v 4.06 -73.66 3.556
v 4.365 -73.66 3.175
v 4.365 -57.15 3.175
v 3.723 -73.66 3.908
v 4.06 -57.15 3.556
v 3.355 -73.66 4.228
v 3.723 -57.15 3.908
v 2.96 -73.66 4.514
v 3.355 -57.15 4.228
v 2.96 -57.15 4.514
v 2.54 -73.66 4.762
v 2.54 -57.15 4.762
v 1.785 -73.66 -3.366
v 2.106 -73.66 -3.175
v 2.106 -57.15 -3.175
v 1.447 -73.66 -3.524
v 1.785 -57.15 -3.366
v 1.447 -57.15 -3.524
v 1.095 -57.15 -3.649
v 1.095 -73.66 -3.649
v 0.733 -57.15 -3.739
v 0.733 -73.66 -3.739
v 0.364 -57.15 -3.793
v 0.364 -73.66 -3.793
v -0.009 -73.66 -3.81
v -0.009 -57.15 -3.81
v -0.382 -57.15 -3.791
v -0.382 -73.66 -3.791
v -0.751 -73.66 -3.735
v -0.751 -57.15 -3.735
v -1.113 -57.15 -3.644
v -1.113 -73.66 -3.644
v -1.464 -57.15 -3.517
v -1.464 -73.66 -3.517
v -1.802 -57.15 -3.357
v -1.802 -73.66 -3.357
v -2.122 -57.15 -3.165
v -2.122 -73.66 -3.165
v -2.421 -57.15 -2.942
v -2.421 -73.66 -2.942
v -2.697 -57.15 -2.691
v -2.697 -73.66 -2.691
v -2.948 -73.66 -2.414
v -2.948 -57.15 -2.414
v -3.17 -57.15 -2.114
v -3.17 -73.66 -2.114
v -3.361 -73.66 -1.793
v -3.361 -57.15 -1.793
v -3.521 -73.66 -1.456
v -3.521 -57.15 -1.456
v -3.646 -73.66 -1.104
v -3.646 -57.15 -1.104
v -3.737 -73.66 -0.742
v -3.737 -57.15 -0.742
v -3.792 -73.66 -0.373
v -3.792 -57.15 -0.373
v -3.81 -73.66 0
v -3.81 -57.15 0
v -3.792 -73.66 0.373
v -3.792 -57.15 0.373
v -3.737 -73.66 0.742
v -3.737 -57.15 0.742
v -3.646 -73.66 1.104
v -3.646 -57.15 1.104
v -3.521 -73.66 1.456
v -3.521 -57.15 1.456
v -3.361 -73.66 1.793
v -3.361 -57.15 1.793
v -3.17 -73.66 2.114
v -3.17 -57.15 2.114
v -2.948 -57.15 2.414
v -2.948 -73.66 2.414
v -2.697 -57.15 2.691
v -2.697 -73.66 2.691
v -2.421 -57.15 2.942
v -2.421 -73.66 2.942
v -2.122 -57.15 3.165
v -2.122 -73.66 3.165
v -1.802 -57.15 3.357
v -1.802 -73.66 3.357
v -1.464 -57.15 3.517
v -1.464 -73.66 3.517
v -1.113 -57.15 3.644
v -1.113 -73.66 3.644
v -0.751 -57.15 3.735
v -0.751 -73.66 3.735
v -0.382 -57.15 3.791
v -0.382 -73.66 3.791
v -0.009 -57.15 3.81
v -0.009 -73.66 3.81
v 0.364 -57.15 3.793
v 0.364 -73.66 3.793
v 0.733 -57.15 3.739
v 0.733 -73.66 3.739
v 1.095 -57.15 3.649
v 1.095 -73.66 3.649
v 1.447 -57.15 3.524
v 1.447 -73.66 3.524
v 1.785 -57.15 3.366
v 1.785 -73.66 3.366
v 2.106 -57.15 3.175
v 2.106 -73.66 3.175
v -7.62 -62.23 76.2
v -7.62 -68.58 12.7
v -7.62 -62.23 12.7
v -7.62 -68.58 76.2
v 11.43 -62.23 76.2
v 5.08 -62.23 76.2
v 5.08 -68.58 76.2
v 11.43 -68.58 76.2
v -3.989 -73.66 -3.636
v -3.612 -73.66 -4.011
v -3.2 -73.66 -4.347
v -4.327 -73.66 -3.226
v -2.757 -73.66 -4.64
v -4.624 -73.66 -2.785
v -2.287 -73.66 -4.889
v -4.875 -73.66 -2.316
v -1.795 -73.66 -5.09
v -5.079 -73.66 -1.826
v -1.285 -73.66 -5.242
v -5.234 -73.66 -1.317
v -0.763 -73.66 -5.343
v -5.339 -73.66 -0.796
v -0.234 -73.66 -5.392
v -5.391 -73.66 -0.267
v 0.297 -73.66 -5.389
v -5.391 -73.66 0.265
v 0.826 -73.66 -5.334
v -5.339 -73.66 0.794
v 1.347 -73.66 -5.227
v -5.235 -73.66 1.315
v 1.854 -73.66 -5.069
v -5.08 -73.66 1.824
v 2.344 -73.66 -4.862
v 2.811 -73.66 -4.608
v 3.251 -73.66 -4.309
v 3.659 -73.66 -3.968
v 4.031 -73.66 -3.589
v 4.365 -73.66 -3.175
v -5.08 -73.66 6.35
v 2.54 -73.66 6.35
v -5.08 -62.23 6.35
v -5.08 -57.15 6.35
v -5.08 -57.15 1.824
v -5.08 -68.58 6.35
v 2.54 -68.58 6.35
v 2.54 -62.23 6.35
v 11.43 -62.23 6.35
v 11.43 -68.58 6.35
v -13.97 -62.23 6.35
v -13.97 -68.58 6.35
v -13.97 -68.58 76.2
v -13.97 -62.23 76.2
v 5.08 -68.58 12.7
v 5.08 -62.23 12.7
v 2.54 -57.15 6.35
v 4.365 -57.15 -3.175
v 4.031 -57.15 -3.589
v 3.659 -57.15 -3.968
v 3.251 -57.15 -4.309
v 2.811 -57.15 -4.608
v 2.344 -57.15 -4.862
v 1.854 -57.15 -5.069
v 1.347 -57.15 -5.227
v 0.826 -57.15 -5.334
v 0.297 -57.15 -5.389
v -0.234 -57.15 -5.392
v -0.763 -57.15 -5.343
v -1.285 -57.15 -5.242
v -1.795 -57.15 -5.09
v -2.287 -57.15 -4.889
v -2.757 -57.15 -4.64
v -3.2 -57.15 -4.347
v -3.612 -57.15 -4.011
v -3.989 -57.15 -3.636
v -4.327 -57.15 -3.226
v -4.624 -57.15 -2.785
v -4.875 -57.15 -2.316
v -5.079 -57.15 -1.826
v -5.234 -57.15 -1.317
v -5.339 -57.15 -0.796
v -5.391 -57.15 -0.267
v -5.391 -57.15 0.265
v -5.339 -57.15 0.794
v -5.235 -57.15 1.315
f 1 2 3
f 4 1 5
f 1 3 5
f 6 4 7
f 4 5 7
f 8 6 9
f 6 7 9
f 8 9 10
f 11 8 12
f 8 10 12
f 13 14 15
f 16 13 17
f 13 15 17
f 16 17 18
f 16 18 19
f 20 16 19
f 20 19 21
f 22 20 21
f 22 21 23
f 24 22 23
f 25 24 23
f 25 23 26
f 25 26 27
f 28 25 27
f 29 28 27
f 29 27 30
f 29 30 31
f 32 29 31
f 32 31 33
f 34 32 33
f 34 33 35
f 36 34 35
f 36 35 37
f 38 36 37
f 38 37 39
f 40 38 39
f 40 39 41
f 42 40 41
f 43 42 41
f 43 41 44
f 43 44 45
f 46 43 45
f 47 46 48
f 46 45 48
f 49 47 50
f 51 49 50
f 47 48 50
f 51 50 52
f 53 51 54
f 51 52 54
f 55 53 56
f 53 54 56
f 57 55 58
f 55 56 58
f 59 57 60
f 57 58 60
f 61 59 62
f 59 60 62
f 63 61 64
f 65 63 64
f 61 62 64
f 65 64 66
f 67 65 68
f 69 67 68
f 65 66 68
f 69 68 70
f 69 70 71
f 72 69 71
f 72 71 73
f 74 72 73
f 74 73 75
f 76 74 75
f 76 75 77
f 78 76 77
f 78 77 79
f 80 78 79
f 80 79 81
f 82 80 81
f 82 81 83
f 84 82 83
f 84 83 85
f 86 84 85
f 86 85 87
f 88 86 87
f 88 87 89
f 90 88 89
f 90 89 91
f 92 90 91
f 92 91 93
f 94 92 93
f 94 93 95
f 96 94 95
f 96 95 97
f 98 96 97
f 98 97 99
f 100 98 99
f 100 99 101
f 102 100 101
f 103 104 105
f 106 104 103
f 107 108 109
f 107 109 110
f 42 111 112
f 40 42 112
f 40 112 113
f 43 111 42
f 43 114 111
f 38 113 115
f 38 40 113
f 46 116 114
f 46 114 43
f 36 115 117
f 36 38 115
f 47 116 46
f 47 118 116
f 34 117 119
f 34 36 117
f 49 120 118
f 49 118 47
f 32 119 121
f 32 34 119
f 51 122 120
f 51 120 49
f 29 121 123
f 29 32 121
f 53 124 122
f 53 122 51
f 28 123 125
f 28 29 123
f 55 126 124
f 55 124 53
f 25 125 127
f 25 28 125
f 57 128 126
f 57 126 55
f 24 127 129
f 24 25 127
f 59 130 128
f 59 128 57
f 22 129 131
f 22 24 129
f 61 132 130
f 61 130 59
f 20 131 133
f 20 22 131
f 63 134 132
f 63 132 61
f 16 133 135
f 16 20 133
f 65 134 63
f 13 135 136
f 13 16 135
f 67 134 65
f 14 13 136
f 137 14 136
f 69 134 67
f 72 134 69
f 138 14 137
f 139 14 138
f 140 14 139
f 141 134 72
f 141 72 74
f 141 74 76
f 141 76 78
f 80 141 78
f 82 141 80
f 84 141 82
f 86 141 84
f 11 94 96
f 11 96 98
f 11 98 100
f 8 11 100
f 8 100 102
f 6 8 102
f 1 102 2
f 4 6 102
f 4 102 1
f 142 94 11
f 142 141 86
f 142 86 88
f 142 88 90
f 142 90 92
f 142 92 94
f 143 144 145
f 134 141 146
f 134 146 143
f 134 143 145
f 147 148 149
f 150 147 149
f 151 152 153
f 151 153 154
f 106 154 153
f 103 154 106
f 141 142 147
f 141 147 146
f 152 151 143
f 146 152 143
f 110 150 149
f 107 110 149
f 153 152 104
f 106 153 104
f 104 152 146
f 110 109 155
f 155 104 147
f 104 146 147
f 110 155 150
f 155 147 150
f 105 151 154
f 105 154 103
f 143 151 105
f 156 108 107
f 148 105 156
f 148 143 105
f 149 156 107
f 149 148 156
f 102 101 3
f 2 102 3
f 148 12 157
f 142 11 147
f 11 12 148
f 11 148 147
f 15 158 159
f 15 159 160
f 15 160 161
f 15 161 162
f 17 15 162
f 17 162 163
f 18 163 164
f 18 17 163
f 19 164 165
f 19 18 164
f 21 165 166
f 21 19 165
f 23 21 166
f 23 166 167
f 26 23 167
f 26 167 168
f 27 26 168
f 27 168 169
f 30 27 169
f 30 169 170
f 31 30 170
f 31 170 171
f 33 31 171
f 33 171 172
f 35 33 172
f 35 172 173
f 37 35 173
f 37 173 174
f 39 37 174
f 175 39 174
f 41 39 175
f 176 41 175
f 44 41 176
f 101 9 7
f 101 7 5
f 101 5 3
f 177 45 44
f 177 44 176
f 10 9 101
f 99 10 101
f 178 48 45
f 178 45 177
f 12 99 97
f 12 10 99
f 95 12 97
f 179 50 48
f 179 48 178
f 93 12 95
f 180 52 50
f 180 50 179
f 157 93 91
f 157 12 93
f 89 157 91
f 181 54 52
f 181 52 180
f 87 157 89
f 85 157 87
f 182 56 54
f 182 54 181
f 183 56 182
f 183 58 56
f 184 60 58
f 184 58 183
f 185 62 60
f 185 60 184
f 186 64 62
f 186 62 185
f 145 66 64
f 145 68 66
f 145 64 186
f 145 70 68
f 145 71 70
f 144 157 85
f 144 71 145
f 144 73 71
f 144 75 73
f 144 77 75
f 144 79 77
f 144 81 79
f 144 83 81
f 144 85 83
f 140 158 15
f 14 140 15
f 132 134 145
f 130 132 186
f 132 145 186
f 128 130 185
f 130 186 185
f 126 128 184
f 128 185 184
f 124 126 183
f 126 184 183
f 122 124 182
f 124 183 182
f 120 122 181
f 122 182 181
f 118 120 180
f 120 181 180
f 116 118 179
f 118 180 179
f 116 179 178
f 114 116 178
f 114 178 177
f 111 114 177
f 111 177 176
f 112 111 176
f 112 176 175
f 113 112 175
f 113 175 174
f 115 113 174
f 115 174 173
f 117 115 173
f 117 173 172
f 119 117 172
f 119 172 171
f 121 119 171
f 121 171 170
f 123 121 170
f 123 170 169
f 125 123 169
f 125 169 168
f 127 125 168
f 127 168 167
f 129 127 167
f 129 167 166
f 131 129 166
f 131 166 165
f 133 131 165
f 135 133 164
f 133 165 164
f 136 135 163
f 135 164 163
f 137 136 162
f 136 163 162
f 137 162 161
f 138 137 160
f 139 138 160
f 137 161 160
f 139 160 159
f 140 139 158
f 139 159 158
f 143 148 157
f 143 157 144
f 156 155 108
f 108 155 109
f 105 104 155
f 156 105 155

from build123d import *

# Parameters (mm, degrees)
F1_DEPTH = 73.66
F3_DEPTH = 73.66
F4_W     = 25.4
F4_H     = 6.349999
F4_H_2   = 6.35
F5_DEPTH = 69.85
F6_W     = 12.7
F6_H     = 63.5
F7_DEPTH = 63.5
F8_W     = 25.4
F8_H     = 82.55
F9_DEPTH = 57.15


with BuildPart() as f1:
    # F0 (on Front) → F1 (new body)
    with BuildSketch(Plane.XZ):
        with BuildLine():
            ThreePointArc((2.106057, -3.175), (-3.81, 0), (2.106057, 3.175))
            Line((2.106057, 3.175), (4.364903, 3.175))
            ThreePointArc((4.364903, 3.175), (-5.3975, 0), (4.364903, -3.175))
            Line((4.364903, -3.175), (2.106057, -3.175))
        make_face()
    extrude(amount=F1_DEPTH)

    # F2 (on face) → F3 (join, through all)
    with BuildSketch(Plane.XZ.offset(73.66)):
        with BuildLine():
            Line((-5.08, 6.35), (-5.08, 1.823899))
            ThreePointArc((-5.08, 1.823899), (-1.942098, 5.035997), (2.54, 4.7625))
            Line((2.54, 4.7625), (2.54, 6.35))
            Line((2.54, 6.35), (-5.08, 6.35))
        make_face()
    extrude(amount=-F3_DEPTH)

    # F4 (on face) → F5 (join)
    with BuildSketch(Plane.XY.offset(6.35)):
        with Locations((-1.27, -65.405)):
            Rectangle(F4_W, F4_H)
        with Locations((-1.27, -8.255)):
            Rectangle(F4_W, F4_H_2)
    extrude(amount=F5_DEPTH)

    # F6 (on face) → F7 (cut, through all)
    with BuildSketch(Plane.XZ.offset(68.58)):
        with Locations((-1.27, 44.45)):
            Rectangle(F6_W, F6_H)
    extrude(amount=-F7_DEPTH, mode=Mode.SUBTRACT)

    # F8 (on face) → F9 (cut)
    with BuildSketch(Plane(origin=(0, 0, 0), x_dir=(-1, 0, 0), z_dir=(0, 1, 0))):
        with Locations((1.27, 34.925)):
            Rectangle(F8_W, F8_H)
    extrude(amount=-F9_DEPTH, mode=Mode.SUBTRACT)


solid = f1.part
